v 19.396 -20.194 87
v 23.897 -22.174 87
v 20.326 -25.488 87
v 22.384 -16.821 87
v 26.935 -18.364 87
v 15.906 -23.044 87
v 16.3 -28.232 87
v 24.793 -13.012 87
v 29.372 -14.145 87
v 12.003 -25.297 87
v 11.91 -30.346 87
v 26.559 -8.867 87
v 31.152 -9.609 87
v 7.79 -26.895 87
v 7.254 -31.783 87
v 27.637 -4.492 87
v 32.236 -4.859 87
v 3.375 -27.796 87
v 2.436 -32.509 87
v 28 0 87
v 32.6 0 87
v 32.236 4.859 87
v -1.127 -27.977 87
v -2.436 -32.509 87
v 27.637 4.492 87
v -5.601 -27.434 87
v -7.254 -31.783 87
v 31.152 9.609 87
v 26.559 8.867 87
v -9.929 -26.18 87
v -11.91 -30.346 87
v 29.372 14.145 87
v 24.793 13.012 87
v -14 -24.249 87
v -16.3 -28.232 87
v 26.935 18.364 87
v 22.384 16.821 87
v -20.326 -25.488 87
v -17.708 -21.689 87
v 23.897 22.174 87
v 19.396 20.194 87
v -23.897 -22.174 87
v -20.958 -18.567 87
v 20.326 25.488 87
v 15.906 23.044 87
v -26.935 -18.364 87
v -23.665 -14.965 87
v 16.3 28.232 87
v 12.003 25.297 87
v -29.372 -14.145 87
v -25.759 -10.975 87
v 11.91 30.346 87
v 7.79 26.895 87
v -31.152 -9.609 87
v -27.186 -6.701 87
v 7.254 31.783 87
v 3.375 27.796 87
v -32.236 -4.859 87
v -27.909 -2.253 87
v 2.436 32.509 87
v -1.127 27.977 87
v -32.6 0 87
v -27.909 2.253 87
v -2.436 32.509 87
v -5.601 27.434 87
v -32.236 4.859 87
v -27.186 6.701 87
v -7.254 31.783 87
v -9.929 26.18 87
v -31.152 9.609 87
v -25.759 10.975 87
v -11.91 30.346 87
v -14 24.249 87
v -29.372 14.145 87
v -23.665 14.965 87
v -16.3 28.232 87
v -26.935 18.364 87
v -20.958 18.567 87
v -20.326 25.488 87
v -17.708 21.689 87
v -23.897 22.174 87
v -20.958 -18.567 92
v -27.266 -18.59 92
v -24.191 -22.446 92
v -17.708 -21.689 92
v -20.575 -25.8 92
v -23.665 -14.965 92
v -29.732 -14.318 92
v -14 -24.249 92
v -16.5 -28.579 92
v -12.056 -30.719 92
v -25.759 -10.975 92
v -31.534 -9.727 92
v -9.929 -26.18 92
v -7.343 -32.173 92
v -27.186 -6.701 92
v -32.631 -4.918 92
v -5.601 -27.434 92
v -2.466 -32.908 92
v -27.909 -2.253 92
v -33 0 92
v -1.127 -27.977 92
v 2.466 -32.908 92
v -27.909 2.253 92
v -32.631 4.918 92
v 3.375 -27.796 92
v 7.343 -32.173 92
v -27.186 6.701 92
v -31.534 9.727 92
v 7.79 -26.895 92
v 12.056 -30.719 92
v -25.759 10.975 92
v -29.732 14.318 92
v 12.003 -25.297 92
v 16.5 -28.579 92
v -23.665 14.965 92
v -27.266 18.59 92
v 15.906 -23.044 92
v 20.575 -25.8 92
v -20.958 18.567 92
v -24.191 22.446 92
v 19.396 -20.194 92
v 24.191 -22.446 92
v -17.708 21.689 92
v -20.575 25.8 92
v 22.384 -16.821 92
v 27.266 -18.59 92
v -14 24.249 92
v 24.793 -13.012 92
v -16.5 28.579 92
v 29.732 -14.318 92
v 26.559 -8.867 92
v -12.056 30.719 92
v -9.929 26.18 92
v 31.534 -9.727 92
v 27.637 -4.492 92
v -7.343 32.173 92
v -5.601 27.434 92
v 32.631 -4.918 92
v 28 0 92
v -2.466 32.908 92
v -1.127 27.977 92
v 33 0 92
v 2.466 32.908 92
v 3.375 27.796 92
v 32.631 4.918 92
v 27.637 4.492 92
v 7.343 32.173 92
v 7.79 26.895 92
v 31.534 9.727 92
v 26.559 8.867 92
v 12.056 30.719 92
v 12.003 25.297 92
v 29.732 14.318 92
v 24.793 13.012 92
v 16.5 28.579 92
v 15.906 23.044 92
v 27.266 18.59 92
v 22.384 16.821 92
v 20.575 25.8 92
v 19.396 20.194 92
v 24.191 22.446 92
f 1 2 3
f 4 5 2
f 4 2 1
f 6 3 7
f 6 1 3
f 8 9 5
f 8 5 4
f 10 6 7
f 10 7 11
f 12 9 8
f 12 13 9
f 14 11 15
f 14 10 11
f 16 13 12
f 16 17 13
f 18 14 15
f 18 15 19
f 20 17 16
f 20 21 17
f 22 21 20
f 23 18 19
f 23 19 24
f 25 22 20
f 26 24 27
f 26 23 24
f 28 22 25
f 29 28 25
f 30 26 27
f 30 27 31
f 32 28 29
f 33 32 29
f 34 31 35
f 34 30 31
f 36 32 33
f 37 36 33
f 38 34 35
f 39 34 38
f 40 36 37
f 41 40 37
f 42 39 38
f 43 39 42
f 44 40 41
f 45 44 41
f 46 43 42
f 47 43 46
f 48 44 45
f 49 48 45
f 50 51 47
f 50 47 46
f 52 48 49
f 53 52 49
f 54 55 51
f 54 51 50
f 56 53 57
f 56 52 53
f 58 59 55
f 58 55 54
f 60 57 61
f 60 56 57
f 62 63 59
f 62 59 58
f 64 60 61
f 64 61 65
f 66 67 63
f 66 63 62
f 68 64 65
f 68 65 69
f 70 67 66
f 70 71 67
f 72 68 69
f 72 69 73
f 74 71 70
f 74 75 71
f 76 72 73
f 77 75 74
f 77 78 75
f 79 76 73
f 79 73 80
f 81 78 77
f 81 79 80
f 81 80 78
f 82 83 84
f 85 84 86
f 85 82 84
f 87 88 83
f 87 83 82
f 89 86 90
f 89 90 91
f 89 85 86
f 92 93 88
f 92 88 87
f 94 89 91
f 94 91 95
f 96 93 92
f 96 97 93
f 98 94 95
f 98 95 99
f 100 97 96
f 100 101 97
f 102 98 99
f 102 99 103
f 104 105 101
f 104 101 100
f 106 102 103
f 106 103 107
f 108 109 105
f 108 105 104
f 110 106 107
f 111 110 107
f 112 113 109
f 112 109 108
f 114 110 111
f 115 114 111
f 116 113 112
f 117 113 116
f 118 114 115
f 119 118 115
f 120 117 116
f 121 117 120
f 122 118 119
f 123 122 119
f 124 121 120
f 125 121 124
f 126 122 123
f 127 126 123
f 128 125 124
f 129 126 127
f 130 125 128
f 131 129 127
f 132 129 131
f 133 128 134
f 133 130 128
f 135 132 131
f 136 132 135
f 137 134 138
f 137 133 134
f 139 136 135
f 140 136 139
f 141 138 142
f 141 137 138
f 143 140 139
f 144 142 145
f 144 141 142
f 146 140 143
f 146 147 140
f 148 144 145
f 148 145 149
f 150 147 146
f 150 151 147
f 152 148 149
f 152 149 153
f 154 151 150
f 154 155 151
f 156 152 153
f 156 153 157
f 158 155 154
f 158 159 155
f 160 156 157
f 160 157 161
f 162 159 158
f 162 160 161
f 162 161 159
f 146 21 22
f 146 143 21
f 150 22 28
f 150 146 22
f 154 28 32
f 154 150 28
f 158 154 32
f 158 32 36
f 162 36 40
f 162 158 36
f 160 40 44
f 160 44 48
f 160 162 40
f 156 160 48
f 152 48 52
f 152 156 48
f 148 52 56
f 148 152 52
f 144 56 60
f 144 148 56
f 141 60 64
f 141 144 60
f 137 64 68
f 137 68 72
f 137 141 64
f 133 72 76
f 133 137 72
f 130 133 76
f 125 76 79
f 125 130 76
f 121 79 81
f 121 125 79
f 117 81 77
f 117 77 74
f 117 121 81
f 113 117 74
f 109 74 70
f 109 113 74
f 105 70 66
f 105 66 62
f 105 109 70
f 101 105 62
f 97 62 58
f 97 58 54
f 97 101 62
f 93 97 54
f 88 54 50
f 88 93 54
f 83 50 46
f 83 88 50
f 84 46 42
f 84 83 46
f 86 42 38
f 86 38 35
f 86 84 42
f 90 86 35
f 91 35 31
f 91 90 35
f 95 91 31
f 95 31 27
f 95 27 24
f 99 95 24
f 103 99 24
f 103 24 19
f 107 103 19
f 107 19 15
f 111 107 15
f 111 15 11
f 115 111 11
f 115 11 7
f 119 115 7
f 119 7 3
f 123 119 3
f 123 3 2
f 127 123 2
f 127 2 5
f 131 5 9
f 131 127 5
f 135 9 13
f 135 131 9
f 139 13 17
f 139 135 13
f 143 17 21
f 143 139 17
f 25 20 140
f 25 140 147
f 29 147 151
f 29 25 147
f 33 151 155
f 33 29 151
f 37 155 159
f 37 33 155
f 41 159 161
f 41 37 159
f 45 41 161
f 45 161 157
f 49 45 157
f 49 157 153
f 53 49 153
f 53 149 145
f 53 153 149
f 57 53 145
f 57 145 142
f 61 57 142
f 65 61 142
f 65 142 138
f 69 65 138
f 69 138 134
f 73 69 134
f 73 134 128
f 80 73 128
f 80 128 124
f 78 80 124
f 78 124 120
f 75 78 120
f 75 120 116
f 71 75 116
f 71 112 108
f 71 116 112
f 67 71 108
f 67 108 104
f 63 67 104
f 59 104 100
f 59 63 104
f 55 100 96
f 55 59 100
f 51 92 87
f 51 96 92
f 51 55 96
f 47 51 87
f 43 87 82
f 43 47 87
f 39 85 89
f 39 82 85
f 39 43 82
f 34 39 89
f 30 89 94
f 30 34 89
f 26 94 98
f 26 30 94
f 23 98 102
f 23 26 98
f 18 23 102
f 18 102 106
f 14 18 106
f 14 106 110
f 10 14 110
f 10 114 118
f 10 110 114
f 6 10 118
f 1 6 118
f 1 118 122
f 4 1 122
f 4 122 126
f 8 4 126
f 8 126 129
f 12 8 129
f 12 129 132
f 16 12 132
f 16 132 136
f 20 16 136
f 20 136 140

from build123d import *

# Parameters (mm, degrees)
CYLINDER004_R     = 28
CYLINDER004_DEPTH = 10


with BuildPart() as cylinder004:
    # Cylinder004 → Cylinder004 (new body)
    with BuildSketch(Plane.XY.offset(86)):
        Circle(CYLINDER004_R)
    extrude(amount=CYLINDER004_DEPTH)


with BuildPart() as cut004:
    # Cone004 → Cone004 (revolve)
    with BuildSketch(Plane(origin=(0, 0, 87), x_dir=(1, 0, 0), z_dir=(0, -1, 0))):
        Polygon((0, 0), (32.6, 0), (33, 5), (0, 5), align=None)
    revolve(axis=Axis((0, 0, 87), (0, 0, 1)))

    # Cut004: cut Cylinder004
    add(cylinder004.part, mode=Mode.SUBTRACT)


solid = cut004.part
